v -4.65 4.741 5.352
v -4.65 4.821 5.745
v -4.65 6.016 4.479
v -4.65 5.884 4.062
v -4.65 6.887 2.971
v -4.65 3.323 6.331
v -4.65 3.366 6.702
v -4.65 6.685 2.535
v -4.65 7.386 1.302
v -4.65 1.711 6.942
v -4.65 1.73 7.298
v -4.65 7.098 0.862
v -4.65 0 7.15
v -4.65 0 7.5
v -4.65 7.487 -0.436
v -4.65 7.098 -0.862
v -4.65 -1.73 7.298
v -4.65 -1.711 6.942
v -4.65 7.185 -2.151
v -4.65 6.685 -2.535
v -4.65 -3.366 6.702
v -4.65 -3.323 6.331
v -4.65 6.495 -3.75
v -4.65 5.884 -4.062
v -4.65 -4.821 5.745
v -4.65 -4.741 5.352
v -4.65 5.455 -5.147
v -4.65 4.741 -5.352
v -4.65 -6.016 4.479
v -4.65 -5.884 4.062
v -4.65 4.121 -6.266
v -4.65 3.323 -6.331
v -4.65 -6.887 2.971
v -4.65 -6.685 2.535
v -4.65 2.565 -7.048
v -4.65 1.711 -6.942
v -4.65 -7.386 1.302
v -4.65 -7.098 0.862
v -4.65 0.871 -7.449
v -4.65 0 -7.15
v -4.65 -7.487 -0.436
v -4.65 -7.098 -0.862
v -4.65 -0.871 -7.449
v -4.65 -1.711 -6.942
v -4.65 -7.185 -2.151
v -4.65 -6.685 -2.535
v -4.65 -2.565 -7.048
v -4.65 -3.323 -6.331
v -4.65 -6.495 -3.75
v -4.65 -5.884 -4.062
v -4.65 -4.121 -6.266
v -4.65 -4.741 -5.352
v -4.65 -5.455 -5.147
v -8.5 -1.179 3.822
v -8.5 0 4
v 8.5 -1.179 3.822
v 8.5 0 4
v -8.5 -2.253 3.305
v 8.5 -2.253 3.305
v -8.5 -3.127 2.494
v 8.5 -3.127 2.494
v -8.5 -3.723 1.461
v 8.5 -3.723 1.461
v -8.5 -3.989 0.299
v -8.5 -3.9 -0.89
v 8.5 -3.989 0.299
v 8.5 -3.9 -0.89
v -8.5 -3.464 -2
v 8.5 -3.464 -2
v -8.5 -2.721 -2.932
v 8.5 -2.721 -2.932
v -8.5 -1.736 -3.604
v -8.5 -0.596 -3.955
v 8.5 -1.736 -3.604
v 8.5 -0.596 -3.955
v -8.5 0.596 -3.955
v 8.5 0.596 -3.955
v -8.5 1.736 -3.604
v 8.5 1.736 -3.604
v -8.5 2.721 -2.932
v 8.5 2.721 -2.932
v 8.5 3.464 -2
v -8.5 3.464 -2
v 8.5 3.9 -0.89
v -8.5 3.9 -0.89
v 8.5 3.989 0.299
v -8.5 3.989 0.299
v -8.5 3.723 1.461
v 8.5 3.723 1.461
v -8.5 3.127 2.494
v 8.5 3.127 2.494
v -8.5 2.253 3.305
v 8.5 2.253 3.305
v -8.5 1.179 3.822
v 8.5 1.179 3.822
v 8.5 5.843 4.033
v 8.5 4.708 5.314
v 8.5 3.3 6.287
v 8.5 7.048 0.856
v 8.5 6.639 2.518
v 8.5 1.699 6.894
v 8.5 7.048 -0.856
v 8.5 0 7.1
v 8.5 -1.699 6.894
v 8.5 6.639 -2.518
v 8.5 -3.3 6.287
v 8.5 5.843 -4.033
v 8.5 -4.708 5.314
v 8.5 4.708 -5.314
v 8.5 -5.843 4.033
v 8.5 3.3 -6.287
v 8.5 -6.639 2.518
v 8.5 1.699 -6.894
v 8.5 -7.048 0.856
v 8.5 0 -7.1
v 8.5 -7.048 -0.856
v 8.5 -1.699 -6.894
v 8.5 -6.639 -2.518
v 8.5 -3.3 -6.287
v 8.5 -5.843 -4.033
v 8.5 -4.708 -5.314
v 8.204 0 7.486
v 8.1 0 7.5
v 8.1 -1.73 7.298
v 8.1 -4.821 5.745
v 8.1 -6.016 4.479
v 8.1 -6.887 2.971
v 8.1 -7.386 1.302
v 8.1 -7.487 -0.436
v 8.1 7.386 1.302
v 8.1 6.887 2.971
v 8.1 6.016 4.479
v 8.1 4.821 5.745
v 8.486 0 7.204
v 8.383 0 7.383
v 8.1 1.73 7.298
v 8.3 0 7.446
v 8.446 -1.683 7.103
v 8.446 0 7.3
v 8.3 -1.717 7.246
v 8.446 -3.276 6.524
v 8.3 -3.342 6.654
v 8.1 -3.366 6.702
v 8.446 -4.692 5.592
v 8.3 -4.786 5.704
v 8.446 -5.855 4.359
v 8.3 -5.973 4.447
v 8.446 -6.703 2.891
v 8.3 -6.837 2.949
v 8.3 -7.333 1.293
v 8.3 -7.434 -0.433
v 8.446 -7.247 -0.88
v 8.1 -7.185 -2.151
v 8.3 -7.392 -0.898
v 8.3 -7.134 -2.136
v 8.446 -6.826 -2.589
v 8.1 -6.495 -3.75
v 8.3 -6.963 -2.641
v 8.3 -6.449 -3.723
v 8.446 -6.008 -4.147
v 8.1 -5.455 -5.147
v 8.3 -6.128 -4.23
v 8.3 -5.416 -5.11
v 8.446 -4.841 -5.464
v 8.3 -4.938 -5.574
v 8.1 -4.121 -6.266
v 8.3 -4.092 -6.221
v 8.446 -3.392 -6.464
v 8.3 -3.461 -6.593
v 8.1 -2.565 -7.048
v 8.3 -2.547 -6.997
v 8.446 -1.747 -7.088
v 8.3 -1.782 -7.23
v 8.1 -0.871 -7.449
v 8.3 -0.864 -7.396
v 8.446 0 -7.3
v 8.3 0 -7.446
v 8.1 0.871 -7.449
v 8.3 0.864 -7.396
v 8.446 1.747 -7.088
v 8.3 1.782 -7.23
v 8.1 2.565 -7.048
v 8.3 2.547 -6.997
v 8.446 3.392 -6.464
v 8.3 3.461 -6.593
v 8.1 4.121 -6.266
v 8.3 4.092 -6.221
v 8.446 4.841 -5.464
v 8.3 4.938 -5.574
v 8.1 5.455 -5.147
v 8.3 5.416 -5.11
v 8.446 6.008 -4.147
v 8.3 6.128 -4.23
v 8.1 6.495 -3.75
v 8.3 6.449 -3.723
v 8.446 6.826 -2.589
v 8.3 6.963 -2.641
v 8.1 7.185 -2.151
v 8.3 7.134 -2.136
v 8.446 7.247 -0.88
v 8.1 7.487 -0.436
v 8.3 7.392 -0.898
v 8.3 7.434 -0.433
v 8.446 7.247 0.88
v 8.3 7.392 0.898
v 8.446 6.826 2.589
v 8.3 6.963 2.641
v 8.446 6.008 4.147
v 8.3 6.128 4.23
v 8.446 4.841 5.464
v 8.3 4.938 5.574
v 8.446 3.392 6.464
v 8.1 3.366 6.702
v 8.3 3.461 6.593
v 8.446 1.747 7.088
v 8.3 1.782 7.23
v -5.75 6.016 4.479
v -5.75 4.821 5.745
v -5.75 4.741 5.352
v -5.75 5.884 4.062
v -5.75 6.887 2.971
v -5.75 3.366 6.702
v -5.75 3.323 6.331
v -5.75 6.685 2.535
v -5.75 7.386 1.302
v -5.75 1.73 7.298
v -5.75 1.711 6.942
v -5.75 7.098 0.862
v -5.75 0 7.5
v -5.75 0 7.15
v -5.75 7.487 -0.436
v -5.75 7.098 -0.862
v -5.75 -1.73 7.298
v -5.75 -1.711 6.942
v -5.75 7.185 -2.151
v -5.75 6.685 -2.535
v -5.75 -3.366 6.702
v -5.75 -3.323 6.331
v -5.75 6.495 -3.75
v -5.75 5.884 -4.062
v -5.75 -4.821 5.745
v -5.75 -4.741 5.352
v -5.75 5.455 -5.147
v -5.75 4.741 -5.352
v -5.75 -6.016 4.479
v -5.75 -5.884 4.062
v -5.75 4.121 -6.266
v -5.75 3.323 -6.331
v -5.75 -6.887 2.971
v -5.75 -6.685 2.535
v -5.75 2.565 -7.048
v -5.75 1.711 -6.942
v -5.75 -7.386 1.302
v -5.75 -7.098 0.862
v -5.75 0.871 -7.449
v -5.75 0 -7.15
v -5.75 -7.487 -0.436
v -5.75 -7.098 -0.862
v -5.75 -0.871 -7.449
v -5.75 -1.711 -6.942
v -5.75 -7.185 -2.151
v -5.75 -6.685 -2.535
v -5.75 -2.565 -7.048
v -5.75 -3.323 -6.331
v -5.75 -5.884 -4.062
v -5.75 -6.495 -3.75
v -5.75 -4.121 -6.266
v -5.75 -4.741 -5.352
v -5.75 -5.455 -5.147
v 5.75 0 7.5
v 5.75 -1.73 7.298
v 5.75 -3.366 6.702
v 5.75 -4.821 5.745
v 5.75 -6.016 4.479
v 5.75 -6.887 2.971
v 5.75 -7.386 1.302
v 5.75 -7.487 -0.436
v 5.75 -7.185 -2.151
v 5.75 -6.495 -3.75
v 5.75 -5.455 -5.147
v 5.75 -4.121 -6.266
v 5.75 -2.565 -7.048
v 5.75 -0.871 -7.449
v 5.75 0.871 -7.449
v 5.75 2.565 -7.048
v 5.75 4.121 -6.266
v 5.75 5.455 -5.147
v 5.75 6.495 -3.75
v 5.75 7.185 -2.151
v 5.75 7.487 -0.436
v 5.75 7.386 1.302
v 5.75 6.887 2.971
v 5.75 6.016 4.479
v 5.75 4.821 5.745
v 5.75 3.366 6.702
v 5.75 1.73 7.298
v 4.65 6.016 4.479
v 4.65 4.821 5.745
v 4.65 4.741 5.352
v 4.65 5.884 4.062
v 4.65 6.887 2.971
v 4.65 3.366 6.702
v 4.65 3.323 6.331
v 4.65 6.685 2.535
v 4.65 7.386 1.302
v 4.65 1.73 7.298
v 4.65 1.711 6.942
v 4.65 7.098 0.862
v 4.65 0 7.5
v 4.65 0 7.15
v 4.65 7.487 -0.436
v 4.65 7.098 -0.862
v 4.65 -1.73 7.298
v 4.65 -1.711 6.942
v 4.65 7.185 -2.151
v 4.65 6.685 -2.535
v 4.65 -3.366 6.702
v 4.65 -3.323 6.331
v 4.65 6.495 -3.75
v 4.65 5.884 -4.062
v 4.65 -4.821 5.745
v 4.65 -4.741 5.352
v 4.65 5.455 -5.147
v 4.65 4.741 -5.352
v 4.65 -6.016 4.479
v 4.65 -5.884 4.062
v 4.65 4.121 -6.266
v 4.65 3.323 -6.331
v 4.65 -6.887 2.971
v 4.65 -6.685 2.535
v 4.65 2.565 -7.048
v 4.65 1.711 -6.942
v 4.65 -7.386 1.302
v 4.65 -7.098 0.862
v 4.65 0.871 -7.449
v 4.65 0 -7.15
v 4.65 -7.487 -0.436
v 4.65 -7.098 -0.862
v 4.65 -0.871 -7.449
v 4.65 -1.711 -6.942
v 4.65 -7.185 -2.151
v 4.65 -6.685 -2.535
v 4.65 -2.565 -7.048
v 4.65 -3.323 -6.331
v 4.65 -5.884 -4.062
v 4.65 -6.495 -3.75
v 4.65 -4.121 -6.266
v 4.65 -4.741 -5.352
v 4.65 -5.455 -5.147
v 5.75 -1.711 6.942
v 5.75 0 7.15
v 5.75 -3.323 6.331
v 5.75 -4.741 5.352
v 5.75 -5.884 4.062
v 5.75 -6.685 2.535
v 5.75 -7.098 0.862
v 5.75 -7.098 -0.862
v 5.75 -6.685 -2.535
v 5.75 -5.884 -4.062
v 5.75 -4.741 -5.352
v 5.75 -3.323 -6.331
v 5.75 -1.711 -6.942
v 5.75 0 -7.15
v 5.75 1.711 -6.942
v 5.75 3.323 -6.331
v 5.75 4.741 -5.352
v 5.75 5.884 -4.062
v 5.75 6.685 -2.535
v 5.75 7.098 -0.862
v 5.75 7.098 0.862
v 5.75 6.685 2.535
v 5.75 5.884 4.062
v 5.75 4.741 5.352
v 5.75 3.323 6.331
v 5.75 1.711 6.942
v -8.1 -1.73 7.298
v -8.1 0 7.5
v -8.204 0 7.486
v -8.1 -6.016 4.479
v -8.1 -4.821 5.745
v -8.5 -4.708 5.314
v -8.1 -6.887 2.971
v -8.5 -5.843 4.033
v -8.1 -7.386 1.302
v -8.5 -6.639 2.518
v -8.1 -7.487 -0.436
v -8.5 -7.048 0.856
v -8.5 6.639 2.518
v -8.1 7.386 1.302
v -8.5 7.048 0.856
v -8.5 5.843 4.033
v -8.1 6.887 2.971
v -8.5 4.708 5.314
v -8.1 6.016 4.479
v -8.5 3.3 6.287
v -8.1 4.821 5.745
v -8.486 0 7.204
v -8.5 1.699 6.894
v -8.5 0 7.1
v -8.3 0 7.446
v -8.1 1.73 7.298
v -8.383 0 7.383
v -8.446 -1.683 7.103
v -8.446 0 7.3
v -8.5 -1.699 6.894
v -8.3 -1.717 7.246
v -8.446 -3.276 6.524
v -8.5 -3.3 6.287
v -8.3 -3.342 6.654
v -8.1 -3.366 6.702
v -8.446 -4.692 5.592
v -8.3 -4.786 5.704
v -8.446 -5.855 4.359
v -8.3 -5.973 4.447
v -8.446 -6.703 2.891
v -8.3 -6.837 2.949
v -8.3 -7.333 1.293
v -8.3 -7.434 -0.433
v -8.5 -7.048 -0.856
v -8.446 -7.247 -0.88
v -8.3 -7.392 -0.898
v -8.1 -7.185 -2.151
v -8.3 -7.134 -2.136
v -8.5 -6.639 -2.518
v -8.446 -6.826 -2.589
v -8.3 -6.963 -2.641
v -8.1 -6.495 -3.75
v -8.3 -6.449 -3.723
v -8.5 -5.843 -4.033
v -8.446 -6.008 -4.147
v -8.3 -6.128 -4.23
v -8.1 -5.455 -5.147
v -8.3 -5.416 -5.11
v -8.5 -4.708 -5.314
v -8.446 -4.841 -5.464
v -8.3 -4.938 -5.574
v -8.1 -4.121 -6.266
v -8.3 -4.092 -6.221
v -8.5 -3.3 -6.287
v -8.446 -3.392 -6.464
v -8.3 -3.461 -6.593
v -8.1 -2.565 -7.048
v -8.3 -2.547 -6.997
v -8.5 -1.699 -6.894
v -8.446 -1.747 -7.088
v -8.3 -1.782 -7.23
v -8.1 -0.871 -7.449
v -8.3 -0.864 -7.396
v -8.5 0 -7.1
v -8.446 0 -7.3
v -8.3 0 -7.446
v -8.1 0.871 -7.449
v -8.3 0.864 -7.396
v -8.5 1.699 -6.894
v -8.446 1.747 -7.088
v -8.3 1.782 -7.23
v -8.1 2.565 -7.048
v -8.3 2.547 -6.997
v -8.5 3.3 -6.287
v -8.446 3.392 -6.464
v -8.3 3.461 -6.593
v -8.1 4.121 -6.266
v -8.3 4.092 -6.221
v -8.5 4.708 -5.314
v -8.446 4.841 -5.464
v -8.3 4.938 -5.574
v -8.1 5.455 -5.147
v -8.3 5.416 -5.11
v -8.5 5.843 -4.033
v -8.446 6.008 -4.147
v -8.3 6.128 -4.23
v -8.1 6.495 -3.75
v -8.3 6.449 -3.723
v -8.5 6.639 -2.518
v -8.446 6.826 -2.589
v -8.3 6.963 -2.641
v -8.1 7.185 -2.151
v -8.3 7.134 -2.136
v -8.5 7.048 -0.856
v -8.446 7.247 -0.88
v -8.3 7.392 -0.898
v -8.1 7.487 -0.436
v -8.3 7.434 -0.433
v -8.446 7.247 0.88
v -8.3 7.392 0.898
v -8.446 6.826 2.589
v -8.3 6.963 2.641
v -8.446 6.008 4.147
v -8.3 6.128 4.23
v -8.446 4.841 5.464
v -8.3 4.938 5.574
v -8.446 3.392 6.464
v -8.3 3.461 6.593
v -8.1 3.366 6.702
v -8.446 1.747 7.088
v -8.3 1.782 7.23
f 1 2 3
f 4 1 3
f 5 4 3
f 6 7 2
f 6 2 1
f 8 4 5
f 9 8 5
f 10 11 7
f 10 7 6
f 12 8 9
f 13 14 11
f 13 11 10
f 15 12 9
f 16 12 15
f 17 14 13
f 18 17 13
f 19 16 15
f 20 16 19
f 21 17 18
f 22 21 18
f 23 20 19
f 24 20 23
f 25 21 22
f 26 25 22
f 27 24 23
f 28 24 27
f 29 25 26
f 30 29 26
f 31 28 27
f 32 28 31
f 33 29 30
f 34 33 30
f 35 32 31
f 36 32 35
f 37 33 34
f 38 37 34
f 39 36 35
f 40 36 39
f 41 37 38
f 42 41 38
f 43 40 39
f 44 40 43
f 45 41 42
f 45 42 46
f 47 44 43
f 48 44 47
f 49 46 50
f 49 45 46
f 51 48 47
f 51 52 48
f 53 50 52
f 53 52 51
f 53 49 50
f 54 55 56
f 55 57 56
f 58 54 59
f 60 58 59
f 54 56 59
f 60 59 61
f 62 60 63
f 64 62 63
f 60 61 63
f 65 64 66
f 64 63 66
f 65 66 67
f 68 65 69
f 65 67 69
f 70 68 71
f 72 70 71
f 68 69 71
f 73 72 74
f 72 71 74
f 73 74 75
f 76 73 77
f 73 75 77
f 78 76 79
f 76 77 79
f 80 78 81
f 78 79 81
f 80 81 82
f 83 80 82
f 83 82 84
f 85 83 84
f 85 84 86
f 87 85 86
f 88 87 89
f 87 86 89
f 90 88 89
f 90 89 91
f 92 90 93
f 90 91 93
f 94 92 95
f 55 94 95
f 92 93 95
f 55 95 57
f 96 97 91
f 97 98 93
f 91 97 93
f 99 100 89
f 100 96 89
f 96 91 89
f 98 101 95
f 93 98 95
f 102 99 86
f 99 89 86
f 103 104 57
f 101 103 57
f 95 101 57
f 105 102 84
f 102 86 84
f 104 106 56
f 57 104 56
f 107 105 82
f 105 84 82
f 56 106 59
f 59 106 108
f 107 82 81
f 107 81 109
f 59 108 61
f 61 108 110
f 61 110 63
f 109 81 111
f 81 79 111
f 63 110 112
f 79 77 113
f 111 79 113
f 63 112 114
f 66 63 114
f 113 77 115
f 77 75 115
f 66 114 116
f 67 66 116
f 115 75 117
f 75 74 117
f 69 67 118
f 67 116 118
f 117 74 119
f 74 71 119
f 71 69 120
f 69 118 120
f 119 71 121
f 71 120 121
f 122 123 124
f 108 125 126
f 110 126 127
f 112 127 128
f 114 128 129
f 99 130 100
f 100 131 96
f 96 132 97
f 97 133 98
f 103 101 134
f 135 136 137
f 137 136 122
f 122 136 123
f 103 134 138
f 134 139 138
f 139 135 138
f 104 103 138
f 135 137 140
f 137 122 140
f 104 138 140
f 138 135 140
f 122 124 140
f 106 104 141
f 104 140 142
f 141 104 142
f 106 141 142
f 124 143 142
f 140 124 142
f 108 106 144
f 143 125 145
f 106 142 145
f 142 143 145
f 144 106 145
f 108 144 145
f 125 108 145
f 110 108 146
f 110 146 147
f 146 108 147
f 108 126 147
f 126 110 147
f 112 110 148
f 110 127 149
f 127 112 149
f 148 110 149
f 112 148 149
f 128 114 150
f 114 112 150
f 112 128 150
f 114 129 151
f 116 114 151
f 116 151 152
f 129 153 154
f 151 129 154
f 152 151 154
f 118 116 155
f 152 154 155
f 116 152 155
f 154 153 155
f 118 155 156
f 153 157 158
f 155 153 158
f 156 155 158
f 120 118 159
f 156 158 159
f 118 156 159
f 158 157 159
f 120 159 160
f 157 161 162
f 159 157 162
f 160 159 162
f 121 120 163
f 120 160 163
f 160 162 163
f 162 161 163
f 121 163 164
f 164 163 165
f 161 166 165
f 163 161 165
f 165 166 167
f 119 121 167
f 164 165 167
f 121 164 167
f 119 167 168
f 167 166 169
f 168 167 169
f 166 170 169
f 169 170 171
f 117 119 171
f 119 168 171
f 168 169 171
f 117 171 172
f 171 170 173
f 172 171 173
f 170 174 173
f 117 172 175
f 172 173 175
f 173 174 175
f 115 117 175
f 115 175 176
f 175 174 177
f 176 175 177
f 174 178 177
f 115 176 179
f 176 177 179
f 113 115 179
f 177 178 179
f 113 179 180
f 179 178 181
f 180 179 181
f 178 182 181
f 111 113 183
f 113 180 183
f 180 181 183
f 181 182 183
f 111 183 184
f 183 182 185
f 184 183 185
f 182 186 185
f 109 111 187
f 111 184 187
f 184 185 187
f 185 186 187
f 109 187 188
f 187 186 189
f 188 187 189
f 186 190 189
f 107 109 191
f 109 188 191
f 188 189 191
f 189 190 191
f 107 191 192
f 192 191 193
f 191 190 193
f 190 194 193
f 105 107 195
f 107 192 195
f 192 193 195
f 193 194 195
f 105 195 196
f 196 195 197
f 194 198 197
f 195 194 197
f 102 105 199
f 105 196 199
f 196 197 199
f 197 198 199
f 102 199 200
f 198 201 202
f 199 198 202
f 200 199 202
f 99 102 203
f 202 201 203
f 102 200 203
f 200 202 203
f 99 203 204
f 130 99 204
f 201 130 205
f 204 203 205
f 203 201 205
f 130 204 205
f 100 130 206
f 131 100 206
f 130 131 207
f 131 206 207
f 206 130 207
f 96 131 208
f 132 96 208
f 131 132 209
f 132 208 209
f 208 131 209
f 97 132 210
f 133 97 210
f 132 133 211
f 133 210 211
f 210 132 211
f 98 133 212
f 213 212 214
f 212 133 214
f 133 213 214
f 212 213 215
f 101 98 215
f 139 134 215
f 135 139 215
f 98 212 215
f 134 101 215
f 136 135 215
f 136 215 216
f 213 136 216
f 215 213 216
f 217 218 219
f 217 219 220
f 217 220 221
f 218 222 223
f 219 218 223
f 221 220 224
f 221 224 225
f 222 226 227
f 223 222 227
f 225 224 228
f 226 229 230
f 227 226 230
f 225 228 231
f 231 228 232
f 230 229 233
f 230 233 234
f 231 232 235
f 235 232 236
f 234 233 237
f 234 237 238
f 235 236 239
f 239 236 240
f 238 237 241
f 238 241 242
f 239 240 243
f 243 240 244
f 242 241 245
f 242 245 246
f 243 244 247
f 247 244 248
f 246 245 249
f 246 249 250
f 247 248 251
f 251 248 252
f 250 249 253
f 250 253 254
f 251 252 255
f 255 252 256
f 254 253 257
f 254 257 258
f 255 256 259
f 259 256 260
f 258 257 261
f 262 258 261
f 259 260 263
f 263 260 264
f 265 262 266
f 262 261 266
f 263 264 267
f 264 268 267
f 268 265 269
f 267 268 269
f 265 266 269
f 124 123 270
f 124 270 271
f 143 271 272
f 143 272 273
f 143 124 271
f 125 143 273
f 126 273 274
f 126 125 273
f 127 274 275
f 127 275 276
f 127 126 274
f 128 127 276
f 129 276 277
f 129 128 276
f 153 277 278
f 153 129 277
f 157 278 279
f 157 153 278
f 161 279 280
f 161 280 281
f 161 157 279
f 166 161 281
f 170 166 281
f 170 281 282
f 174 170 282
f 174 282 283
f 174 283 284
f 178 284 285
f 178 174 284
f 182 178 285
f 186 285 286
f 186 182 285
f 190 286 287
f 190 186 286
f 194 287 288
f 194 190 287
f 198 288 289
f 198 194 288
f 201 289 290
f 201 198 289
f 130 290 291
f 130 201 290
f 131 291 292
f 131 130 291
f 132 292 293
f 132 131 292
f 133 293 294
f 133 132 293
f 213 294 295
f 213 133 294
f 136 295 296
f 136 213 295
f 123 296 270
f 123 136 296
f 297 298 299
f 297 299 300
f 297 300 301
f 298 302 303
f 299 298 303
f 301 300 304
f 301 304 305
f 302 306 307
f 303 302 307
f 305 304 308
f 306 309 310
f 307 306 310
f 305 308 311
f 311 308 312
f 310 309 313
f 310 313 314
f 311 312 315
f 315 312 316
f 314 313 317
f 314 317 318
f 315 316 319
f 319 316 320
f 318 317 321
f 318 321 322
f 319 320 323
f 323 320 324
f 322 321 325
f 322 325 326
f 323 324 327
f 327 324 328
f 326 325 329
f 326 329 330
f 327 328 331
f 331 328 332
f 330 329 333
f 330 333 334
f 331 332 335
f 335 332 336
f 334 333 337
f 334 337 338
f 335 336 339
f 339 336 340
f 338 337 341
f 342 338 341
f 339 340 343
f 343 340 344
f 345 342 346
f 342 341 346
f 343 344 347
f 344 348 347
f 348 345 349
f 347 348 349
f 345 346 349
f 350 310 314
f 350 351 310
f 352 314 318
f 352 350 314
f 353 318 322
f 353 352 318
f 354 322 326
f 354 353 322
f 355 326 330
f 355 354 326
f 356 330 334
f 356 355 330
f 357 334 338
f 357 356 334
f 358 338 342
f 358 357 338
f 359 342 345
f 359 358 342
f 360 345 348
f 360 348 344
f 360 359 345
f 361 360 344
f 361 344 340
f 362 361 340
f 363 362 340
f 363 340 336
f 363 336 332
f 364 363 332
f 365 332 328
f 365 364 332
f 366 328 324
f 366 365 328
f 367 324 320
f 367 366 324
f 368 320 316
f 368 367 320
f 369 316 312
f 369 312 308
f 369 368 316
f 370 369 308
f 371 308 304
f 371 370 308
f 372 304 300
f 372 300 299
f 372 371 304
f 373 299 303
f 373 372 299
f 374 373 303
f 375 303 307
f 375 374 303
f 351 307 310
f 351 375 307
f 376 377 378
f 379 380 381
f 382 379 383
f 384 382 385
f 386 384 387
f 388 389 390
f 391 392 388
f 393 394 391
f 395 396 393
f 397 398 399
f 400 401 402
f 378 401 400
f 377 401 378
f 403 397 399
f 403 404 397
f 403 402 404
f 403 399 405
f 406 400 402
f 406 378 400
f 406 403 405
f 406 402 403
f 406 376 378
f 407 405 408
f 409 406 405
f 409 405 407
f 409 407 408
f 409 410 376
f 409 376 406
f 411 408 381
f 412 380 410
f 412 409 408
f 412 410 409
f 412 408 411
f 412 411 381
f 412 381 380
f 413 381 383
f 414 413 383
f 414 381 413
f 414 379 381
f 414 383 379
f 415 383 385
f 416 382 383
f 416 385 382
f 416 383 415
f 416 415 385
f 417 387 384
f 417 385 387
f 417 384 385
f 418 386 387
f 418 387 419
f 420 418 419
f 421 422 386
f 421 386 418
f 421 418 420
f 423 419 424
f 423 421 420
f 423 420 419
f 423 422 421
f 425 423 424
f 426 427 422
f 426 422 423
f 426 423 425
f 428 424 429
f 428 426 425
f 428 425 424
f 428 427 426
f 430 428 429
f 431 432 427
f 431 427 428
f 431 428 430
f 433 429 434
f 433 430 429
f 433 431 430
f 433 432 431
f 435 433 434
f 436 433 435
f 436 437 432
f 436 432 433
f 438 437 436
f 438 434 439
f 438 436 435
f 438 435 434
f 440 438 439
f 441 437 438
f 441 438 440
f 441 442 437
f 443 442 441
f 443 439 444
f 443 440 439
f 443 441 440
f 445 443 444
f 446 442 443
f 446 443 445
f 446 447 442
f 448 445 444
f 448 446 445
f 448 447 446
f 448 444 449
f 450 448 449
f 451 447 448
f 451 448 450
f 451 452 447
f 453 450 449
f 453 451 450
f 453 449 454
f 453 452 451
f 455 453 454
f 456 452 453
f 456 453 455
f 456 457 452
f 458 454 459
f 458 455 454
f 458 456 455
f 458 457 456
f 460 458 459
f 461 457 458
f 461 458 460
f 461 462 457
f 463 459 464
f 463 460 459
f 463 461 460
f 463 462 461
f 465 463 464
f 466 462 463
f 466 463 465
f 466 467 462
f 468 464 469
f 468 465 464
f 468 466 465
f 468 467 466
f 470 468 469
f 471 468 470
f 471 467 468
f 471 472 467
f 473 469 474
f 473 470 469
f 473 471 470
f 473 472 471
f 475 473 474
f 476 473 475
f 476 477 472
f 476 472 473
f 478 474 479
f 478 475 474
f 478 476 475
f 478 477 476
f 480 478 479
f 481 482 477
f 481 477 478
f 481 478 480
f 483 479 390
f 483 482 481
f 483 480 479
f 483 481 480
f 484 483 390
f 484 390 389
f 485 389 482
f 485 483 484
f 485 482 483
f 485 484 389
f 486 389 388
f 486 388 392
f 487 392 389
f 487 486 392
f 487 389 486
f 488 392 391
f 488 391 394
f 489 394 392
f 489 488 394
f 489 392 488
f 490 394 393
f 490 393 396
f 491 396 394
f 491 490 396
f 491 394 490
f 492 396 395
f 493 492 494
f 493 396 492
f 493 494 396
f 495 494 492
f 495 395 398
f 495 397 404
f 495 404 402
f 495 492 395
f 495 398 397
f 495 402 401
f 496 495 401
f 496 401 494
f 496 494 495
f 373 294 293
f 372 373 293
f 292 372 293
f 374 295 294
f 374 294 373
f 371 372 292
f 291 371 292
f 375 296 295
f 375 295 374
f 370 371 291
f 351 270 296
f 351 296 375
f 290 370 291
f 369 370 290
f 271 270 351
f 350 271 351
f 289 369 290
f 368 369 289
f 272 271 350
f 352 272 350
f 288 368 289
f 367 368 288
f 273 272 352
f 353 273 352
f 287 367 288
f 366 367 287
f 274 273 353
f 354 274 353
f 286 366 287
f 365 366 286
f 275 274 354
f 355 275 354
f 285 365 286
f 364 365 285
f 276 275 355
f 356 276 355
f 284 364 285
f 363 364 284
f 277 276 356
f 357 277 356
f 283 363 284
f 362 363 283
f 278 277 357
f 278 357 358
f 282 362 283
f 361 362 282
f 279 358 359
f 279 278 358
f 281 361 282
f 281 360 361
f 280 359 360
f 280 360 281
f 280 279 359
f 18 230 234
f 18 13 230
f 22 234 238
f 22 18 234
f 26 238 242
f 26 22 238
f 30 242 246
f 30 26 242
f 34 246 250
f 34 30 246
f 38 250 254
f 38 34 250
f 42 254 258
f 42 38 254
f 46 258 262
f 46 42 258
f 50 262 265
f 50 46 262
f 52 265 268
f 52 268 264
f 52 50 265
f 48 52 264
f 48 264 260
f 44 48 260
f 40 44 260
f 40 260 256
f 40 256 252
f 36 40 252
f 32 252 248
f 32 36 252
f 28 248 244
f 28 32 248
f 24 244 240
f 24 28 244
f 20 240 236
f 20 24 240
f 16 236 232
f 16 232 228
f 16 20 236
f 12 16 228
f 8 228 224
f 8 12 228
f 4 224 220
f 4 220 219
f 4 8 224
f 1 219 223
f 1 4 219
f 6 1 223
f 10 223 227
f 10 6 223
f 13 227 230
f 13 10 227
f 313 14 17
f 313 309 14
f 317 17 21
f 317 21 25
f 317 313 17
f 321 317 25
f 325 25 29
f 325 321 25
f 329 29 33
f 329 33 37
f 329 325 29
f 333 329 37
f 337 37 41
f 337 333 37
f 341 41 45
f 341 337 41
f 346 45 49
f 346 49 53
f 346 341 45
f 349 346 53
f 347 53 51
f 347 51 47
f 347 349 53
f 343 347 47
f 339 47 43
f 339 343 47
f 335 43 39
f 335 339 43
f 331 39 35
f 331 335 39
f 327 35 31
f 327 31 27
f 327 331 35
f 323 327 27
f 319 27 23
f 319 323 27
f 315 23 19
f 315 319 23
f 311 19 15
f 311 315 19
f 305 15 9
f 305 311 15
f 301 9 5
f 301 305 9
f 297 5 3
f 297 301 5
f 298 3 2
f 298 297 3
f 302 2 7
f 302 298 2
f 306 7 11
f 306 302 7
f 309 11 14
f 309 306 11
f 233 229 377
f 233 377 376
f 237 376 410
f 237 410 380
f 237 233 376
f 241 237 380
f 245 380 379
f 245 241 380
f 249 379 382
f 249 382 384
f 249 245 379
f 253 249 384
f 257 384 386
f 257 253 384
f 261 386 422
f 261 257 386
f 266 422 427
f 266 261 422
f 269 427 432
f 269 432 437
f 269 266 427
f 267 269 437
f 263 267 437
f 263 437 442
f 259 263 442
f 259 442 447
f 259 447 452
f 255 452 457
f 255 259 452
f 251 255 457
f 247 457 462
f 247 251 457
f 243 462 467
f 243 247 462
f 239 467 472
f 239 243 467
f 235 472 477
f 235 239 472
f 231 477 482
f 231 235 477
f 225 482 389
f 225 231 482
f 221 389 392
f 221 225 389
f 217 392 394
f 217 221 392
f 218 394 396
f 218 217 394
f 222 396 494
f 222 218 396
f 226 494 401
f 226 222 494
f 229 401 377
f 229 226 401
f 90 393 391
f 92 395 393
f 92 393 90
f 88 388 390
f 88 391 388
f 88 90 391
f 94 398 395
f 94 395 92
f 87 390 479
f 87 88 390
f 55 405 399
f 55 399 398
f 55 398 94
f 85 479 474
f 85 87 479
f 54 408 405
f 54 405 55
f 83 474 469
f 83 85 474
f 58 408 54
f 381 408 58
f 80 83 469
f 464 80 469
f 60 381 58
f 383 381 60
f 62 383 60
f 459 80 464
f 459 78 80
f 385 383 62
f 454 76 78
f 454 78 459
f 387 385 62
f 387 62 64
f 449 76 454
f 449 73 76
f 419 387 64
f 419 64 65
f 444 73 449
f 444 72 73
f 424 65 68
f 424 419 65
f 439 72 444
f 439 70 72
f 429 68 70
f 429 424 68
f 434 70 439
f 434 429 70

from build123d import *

# Parameters (mm, degrees)
SKETCH_1_W = 17
SKETCH_1_H = 3.5
SKETCH_2_W = 1.1
SKETCH_2_H = 0.35
FILLET_1_R = 0.4


with BuildPart() as part:
    # 草图1 → 旋转1 (revolve)
    with BuildSketch(Plane.XY, mode=Mode.PRIVATE) as revolve_1_sk:
        with Locations((0, 5.75)):
            Rectangle(SKETCH_1_W, SKETCH_1_H)
    revolve(revolve_1_sk.sketch.rotate(Axis((0, 0, 0), (1, 0, 0)), 90), axis=Axis((0, 0, 0), (1, 0, 0)))

    # 草图2 → 切除-旋转1 (revolve, cut)
    with BuildSketch(Plane.XY, mode=Mode.PRIVATE) as cut_revolve_1_sk:
        with Locations((-5.2, 7.325)):
            Rectangle(SKETCH_2_W, SKETCH_2_H)
        with Locations((5.2, 7.325)):
            Rectangle(SKETCH_2_W, SKETCH_2_H)
    revolve(cut_revolve_1_sk.sketch.rotate(Axis((0, 0, 0), (1, 0, 0)), 90), axis=Axis((0, 0, 0), (1, 0, 0)), mode=Mode.SUBTRACT)

    # 圆角1
    fillet_1_edges = [part.edges().sort_by_distance(p)[0] for p in [
        (-8.5, 0, -7.5),
        (8.5, 0, -7.5),
    ]]
    fillet(fillet_1_edges, radius=FILLET_1_R)


solid = part.part
